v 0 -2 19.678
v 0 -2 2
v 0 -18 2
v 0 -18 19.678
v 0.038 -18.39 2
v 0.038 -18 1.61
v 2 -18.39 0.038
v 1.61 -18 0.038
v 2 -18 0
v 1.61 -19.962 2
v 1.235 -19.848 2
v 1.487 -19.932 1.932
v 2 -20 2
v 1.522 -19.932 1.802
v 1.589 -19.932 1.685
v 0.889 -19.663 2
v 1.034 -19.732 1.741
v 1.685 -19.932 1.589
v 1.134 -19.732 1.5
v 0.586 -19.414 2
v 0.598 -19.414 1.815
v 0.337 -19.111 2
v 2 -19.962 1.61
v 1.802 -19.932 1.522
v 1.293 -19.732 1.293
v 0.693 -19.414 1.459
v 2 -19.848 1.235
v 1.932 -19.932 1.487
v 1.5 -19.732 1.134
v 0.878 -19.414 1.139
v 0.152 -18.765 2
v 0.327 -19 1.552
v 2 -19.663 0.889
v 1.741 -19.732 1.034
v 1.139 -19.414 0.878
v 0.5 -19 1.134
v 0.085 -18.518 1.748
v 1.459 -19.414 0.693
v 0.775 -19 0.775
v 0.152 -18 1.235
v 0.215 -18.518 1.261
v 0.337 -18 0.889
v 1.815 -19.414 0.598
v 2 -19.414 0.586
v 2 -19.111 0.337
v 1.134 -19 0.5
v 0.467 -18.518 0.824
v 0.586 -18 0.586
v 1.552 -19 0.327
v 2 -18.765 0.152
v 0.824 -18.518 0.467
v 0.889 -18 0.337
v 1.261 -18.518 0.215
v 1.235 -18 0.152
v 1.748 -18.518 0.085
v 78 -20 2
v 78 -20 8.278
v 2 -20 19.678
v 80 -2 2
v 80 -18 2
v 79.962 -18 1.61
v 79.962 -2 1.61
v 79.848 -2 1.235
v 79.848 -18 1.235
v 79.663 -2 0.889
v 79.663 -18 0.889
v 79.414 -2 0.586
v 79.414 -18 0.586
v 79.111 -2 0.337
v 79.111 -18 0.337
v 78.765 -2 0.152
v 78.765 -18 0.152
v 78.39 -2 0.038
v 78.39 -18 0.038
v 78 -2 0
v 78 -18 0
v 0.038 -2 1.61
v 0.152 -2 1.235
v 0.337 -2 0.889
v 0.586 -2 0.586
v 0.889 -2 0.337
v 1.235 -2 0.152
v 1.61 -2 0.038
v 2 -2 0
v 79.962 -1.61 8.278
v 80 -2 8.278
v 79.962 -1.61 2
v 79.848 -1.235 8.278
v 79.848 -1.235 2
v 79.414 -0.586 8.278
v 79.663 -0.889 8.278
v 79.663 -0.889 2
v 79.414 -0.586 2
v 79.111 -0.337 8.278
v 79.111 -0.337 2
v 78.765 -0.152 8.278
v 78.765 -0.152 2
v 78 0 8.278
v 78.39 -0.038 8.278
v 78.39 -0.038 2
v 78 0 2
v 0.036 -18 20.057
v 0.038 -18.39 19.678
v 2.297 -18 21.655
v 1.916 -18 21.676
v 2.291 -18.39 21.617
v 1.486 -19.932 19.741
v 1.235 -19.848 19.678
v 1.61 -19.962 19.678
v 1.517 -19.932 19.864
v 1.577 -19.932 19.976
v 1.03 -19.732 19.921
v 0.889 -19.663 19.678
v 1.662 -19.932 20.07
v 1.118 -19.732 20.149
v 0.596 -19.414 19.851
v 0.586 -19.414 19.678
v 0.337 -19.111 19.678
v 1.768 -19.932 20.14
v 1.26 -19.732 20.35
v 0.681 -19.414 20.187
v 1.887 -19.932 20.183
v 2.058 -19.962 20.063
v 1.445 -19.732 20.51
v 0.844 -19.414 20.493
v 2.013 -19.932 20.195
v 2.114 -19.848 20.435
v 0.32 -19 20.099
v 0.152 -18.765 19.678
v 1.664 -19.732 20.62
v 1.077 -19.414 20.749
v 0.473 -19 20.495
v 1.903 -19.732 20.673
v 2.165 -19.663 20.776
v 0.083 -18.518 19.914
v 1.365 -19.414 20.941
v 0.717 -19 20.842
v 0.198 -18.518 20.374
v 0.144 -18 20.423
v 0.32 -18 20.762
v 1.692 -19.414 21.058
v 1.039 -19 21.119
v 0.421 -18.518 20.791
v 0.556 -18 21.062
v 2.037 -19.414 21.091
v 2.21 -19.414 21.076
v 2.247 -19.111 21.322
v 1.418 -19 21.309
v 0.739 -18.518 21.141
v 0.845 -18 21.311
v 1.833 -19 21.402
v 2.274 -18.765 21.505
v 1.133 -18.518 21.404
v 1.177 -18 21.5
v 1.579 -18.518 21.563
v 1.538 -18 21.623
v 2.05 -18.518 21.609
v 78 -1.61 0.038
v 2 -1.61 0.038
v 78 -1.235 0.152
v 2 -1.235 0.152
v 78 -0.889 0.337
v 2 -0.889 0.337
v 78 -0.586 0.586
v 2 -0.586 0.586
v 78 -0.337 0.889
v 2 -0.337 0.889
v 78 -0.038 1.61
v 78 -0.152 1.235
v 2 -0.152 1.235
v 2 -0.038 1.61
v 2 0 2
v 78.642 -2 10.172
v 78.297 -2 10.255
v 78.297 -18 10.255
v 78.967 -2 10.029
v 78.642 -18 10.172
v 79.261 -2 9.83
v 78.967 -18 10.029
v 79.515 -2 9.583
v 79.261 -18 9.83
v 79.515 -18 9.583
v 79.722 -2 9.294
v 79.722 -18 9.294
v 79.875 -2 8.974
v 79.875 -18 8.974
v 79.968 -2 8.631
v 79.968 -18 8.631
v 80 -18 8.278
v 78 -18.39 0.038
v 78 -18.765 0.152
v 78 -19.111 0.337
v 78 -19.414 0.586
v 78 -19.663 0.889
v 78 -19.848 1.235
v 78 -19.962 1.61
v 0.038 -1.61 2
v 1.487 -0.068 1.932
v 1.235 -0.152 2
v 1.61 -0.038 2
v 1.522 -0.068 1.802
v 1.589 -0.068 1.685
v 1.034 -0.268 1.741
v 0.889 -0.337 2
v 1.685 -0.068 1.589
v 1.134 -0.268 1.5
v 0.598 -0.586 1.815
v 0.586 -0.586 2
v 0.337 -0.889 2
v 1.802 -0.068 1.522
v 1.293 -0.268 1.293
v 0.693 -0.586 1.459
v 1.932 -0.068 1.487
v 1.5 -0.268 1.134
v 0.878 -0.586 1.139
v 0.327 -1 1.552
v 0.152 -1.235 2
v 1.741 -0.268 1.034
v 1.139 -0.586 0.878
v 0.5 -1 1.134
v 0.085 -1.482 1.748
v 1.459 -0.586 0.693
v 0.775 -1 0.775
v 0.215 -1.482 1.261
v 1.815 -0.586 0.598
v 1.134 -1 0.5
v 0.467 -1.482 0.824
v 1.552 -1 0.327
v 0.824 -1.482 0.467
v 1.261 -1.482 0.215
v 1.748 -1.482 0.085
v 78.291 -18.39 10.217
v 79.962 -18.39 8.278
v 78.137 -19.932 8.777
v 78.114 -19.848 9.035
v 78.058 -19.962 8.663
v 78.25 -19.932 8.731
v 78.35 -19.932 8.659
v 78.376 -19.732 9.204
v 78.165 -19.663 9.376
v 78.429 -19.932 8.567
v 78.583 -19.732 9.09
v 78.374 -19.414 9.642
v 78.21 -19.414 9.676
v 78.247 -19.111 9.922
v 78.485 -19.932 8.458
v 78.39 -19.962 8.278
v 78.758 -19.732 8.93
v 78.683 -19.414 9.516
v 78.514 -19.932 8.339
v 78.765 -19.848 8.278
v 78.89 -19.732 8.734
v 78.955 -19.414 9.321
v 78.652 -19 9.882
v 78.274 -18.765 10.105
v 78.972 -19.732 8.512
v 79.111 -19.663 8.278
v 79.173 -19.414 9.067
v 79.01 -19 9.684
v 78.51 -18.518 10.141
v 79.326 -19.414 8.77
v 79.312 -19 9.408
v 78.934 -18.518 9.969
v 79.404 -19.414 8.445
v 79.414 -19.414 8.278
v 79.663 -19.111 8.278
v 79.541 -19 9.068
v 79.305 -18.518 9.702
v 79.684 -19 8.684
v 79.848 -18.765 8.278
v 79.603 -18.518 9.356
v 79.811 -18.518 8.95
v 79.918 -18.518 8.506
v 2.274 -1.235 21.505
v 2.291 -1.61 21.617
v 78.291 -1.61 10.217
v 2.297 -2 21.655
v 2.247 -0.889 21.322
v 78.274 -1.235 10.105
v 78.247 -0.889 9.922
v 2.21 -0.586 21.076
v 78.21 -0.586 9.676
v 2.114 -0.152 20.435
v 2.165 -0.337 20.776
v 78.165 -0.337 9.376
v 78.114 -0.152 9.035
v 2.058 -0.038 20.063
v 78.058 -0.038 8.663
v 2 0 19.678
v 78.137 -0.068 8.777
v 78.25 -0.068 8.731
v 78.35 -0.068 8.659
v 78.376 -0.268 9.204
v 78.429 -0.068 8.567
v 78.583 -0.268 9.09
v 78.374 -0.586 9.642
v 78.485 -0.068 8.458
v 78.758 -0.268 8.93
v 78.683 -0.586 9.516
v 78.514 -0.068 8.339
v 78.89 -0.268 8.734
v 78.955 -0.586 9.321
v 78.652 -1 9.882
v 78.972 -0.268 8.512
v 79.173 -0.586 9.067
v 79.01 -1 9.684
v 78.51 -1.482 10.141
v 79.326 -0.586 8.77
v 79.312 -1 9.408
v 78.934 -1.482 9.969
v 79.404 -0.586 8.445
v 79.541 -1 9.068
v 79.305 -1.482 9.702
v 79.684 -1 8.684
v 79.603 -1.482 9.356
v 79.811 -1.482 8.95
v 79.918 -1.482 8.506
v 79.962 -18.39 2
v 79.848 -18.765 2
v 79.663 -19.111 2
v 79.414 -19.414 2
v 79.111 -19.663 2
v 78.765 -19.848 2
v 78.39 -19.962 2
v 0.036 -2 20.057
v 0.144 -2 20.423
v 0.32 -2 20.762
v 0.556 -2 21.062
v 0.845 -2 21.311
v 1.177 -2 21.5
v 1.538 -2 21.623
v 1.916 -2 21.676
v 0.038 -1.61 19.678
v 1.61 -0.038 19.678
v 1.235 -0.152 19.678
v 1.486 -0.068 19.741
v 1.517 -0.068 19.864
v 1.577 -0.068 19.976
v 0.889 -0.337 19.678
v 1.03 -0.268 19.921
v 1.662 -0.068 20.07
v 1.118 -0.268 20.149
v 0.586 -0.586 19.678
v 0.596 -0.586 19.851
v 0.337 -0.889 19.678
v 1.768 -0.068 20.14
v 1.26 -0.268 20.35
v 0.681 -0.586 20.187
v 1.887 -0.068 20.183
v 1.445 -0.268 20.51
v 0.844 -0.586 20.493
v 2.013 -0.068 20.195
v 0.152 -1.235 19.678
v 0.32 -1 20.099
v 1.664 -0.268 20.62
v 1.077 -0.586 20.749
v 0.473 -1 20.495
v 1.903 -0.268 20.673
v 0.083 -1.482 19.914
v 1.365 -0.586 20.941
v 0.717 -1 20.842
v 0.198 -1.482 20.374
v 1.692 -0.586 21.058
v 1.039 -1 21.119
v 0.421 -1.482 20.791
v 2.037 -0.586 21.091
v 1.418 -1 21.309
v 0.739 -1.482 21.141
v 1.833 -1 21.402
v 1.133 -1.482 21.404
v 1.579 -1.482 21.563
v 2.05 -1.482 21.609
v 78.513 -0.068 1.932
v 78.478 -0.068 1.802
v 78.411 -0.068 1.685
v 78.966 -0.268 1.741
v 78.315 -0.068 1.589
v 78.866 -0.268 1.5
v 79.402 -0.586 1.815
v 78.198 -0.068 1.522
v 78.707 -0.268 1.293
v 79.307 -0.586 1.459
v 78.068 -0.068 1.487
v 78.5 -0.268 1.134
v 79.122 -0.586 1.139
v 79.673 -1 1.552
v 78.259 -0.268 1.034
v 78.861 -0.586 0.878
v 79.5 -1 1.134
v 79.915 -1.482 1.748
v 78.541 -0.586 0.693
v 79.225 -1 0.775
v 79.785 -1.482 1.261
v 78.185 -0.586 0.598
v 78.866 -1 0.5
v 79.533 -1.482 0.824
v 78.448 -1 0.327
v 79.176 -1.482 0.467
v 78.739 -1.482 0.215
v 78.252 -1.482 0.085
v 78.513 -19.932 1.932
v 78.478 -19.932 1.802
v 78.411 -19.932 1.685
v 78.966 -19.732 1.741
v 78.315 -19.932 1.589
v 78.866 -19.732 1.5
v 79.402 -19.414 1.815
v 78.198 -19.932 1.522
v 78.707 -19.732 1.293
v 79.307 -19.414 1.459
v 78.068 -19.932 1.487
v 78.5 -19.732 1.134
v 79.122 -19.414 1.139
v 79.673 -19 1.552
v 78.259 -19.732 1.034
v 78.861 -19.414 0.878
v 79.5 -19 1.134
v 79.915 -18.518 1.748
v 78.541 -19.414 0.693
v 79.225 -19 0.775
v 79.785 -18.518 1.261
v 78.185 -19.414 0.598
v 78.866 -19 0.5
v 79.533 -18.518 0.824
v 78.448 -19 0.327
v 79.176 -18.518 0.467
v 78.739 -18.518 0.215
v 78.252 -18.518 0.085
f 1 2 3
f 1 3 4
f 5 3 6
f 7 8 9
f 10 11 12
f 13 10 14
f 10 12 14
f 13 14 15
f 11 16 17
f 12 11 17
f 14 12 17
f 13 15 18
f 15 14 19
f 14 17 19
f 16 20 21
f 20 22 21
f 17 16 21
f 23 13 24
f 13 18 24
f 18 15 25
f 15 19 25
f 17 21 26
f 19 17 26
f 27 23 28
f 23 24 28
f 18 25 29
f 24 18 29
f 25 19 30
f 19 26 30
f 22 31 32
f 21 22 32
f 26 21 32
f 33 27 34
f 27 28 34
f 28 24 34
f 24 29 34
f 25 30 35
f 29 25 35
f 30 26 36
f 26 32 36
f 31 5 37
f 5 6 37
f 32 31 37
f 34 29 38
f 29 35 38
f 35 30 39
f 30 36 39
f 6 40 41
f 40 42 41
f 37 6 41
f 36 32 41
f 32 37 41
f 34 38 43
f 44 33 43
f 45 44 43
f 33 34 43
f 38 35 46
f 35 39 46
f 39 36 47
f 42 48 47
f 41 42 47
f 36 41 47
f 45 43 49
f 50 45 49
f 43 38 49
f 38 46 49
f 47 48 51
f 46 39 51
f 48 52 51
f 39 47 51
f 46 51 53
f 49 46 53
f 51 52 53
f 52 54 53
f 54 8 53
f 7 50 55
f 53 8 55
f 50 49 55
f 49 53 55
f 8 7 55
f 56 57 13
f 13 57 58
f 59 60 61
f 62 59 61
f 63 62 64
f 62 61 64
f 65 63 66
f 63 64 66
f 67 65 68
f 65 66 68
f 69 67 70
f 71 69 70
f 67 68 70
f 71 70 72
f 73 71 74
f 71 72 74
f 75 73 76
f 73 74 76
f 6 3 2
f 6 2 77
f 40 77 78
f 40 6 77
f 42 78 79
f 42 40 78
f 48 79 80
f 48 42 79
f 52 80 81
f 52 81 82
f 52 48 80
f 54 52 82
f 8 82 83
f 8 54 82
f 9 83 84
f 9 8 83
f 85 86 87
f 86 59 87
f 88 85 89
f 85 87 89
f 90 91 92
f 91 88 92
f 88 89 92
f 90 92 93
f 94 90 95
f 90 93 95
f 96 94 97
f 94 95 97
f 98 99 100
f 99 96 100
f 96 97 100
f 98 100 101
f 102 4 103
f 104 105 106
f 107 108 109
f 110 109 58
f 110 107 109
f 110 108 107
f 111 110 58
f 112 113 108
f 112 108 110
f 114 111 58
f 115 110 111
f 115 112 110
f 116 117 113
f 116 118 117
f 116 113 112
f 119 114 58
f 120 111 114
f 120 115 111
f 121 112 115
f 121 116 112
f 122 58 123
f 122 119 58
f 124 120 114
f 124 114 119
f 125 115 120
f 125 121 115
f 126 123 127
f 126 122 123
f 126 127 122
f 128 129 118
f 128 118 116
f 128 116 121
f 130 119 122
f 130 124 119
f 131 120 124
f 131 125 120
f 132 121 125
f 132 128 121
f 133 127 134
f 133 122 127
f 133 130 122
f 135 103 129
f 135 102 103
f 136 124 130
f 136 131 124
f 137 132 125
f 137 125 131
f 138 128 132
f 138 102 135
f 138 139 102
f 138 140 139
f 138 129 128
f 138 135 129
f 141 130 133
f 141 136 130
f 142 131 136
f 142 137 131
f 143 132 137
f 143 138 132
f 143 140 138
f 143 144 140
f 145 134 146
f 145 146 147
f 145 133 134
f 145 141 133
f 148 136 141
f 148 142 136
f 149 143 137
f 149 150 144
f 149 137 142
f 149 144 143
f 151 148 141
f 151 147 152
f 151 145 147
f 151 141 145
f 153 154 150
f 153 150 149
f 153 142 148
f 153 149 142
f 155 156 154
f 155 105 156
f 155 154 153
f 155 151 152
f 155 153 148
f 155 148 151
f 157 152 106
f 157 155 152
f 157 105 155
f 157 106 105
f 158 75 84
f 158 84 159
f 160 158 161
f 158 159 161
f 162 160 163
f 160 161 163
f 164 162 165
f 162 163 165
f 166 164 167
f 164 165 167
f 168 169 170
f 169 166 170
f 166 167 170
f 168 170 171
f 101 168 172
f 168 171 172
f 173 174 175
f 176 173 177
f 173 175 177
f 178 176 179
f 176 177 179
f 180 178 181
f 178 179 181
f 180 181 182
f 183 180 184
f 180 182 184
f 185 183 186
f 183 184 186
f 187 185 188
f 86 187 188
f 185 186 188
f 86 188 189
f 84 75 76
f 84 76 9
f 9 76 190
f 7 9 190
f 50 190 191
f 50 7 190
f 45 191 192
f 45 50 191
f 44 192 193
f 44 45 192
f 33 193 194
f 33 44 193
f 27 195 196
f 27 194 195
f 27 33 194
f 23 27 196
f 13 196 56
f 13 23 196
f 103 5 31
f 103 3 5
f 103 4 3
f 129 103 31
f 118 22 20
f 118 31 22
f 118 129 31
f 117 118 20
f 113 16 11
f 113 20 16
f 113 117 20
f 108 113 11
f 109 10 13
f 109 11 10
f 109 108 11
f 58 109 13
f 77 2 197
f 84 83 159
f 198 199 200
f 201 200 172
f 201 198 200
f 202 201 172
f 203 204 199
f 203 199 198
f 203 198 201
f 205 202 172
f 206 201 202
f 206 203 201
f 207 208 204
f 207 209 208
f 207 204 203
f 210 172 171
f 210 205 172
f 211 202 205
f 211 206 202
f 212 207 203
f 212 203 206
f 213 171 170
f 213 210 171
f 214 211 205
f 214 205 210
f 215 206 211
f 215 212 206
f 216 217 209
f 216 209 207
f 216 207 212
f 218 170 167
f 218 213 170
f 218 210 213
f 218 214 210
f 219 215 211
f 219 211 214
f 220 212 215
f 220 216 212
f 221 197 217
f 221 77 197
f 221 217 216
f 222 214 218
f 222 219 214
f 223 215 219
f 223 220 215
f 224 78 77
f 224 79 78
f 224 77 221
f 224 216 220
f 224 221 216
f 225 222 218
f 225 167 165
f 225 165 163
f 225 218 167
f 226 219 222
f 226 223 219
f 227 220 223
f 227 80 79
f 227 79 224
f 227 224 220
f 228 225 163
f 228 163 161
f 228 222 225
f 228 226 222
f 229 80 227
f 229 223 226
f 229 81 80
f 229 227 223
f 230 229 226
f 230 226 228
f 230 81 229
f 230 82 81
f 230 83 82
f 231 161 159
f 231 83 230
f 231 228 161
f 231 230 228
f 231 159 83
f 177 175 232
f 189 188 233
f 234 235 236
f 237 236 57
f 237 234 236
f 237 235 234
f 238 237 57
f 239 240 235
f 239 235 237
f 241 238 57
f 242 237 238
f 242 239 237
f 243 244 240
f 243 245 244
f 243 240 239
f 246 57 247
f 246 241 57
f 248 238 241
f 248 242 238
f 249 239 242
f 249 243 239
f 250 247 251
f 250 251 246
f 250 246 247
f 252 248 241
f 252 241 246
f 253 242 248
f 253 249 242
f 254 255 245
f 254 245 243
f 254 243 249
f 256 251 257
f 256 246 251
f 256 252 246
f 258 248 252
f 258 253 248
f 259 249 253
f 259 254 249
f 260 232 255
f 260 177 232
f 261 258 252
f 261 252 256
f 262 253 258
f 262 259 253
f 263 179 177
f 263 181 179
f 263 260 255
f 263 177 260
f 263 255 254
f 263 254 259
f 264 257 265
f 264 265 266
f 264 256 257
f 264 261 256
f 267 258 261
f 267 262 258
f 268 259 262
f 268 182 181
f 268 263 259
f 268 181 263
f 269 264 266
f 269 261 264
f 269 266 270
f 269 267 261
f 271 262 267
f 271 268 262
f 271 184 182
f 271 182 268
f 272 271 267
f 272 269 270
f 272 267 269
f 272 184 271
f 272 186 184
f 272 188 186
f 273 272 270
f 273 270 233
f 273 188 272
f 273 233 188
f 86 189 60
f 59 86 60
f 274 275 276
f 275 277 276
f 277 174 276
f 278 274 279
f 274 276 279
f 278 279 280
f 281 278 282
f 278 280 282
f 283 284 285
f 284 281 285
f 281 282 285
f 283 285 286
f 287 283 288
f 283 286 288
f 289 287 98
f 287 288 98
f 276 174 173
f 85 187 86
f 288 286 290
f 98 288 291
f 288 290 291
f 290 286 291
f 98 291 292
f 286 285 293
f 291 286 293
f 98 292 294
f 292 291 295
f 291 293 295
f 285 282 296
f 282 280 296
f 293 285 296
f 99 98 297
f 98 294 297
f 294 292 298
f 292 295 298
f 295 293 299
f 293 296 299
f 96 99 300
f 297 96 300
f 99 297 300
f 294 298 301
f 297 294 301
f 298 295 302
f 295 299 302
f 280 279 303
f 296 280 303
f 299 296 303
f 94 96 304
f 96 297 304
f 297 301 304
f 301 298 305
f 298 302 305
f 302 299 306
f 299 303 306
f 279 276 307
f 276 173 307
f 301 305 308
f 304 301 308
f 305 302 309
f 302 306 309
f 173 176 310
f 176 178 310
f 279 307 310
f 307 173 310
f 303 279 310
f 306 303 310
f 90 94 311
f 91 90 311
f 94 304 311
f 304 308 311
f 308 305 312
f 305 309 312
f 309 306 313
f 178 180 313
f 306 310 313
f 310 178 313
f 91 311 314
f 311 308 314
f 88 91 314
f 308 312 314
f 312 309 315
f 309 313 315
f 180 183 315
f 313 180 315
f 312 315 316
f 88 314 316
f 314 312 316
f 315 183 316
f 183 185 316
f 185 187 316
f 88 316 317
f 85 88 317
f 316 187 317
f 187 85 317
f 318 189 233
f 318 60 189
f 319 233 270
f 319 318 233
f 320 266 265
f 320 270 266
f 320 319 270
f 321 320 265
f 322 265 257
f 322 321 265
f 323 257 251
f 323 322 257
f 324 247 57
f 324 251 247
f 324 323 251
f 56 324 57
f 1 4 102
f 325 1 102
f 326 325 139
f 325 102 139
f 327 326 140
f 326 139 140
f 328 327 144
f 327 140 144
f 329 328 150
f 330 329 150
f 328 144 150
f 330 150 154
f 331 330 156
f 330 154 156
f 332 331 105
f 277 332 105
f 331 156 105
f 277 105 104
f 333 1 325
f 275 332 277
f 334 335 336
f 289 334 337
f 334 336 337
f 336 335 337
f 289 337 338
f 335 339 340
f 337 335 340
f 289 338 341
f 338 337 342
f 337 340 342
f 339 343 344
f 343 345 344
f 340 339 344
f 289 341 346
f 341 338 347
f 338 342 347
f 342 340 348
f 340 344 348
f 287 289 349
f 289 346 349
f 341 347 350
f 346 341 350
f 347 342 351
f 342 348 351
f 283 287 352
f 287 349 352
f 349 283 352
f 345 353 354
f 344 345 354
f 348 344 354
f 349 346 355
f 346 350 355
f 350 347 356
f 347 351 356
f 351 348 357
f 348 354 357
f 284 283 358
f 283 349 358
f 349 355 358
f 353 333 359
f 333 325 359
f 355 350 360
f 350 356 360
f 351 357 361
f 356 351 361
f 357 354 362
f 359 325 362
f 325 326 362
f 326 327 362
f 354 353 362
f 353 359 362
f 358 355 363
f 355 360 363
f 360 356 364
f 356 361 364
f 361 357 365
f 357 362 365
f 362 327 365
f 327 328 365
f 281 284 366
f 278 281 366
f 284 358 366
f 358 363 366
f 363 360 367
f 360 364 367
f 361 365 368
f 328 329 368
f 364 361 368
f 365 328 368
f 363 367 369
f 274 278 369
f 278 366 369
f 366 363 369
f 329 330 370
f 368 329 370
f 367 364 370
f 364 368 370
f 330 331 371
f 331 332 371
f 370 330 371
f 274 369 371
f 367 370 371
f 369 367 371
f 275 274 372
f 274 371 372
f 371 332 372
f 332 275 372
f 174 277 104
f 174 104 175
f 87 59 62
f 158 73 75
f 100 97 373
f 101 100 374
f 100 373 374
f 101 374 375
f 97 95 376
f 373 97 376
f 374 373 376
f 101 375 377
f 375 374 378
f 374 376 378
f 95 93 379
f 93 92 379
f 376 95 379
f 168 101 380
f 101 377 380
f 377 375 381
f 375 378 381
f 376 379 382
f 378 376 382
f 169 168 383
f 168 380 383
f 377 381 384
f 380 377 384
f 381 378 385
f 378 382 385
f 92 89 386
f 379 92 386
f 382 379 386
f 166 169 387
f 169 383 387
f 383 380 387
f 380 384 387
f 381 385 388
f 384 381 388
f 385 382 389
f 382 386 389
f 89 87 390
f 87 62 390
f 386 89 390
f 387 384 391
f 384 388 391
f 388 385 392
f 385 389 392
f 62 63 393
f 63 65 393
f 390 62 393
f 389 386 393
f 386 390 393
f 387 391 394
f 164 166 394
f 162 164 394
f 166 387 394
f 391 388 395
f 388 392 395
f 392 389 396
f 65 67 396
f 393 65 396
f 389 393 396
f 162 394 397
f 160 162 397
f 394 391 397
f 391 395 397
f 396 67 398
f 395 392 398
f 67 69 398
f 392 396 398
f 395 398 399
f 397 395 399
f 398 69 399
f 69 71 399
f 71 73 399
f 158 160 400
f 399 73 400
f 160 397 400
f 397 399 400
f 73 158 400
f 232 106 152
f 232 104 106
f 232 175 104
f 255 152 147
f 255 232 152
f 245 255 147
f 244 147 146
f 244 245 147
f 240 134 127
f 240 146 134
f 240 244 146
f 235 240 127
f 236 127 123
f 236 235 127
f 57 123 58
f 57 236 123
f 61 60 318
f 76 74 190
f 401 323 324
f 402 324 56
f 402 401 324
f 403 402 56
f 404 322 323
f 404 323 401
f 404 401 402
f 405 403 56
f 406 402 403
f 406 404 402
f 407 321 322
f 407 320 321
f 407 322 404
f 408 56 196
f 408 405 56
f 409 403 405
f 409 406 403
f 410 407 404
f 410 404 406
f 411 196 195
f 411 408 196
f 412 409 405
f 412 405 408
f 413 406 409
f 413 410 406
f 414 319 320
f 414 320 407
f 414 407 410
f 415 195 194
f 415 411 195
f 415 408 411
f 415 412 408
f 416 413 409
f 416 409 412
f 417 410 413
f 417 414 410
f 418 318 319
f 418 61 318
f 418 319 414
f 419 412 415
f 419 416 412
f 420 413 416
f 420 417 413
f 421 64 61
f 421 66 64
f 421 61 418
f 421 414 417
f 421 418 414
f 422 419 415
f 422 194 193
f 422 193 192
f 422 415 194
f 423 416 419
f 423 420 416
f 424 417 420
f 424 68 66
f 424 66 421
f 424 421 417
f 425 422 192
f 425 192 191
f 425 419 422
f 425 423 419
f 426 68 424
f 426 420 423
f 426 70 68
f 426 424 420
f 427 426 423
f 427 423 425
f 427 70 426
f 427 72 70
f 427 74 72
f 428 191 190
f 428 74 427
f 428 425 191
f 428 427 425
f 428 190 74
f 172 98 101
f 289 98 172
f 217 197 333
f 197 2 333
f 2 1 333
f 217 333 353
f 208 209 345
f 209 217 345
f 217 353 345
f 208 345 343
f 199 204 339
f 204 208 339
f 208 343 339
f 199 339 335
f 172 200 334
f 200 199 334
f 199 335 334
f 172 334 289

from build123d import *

# Parameters (mm, degrees)
PAD_DEPTH = 20
FILLET_R  = 2


with BuildPart() as part:
    # Sketch → Pad (new body)
    with BuildSketch(Plane.XZ):
        Polygon((0, 0), (0, 22), (80, 10), (80, 0), align=None)
    extrude(amount=PAD_DEPTH)

    # Fillet
    fillet_edges = [part.edges().sort_by_distance(p)[0] for p in [
        (0, -10, 0),
        (0, -10, 22),
        (0, 0, 11),
        (0, -20, 11),
        (80, -10, 10),
        (40, 0, 16),
        (40, -20, 16),
        (80, -10, 0),
        (80, 0, 5),
        (80, -20, 5),
        (40, 0, 0),
        (40, -20, 0),
    ]]
    fillet(fillet_edges, radius=FILLET_R)


solid = part.part
